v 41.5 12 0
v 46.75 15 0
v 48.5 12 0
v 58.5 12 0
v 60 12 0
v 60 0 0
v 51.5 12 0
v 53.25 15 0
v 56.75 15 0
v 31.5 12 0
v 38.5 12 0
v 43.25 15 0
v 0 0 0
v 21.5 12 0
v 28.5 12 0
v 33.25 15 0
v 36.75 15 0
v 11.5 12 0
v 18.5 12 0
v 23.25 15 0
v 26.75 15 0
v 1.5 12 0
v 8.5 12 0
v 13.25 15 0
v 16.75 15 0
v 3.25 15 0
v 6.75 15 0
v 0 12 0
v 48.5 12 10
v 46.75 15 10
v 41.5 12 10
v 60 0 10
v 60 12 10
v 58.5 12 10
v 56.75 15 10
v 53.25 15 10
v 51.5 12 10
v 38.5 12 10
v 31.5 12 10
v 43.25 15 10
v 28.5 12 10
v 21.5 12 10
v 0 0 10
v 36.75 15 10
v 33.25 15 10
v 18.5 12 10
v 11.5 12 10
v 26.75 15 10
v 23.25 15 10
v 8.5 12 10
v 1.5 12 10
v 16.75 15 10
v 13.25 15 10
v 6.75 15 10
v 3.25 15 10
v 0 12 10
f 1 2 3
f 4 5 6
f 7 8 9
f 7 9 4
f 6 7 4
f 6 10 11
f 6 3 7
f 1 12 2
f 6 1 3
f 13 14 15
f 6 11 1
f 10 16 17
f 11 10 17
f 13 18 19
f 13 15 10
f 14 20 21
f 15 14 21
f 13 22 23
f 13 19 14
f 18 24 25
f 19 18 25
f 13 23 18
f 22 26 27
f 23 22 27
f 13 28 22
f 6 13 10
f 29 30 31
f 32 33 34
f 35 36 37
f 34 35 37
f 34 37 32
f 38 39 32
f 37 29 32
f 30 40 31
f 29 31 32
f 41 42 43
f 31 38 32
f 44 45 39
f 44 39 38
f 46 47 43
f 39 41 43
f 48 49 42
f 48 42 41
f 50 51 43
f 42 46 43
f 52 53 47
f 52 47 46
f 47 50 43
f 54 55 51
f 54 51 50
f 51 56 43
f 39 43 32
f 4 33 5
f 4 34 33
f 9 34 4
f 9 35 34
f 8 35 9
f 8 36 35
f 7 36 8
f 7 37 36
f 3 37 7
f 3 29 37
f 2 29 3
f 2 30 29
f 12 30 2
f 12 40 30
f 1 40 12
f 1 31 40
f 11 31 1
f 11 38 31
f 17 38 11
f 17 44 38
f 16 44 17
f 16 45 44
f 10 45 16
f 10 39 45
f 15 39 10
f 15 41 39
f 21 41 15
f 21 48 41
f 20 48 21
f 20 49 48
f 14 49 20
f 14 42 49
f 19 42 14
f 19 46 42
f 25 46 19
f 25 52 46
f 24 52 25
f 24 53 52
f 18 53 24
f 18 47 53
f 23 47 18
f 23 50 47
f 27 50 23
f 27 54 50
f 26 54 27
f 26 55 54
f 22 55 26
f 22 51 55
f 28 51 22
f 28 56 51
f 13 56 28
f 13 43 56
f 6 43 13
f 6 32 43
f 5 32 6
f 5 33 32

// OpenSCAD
$fn = 32;

// ----------------------------------------------------------------------
// Gear rack: 6 teeth, pitch 10 mm
// ----------------------------------------------------------------------

// --- parameters (mm) ---
teeth = 6;                // number of teeth
pitch = 10;               // tooth pitch, X
root_w = 7;               // tooth width at the root
tip_w = 3.5;              // tooth width at the tip
base_h = 12;              // rack body height, Y
tooth_h = 3;              // tooth height above the body
plate_t = 10;             // rack width, Z (extrusion height)

rack_l = teeth * pitch;  // overall length
total_h = base_h + tooth_h;  // overall height

profile = [[0, 0], [60, 0], [60, 12], [58.5, 12], [56.75, 15], [53.25, 15], [51.5, 12], [48.5, 12], [46.75, 15], [43.25, 15], [41.5, 12], [38.5, 12], [36.75, 15], [33.25, 15], [31.5, 12], [28.5, 12], [26.75, 15], [23.25, 15], [21.5, 12], [18.5, 12], [16.75, 15], [13.25, 15], [11.5, 12], [8.5, 12], [6.75, 15], [3.25, 15], [1.5, 12], [0, 12]];  // primary outline, 28 points, counter clockwise

// --- the one profile operation ---
linear_extrude(height = plate_t) polygon(points = profile);
